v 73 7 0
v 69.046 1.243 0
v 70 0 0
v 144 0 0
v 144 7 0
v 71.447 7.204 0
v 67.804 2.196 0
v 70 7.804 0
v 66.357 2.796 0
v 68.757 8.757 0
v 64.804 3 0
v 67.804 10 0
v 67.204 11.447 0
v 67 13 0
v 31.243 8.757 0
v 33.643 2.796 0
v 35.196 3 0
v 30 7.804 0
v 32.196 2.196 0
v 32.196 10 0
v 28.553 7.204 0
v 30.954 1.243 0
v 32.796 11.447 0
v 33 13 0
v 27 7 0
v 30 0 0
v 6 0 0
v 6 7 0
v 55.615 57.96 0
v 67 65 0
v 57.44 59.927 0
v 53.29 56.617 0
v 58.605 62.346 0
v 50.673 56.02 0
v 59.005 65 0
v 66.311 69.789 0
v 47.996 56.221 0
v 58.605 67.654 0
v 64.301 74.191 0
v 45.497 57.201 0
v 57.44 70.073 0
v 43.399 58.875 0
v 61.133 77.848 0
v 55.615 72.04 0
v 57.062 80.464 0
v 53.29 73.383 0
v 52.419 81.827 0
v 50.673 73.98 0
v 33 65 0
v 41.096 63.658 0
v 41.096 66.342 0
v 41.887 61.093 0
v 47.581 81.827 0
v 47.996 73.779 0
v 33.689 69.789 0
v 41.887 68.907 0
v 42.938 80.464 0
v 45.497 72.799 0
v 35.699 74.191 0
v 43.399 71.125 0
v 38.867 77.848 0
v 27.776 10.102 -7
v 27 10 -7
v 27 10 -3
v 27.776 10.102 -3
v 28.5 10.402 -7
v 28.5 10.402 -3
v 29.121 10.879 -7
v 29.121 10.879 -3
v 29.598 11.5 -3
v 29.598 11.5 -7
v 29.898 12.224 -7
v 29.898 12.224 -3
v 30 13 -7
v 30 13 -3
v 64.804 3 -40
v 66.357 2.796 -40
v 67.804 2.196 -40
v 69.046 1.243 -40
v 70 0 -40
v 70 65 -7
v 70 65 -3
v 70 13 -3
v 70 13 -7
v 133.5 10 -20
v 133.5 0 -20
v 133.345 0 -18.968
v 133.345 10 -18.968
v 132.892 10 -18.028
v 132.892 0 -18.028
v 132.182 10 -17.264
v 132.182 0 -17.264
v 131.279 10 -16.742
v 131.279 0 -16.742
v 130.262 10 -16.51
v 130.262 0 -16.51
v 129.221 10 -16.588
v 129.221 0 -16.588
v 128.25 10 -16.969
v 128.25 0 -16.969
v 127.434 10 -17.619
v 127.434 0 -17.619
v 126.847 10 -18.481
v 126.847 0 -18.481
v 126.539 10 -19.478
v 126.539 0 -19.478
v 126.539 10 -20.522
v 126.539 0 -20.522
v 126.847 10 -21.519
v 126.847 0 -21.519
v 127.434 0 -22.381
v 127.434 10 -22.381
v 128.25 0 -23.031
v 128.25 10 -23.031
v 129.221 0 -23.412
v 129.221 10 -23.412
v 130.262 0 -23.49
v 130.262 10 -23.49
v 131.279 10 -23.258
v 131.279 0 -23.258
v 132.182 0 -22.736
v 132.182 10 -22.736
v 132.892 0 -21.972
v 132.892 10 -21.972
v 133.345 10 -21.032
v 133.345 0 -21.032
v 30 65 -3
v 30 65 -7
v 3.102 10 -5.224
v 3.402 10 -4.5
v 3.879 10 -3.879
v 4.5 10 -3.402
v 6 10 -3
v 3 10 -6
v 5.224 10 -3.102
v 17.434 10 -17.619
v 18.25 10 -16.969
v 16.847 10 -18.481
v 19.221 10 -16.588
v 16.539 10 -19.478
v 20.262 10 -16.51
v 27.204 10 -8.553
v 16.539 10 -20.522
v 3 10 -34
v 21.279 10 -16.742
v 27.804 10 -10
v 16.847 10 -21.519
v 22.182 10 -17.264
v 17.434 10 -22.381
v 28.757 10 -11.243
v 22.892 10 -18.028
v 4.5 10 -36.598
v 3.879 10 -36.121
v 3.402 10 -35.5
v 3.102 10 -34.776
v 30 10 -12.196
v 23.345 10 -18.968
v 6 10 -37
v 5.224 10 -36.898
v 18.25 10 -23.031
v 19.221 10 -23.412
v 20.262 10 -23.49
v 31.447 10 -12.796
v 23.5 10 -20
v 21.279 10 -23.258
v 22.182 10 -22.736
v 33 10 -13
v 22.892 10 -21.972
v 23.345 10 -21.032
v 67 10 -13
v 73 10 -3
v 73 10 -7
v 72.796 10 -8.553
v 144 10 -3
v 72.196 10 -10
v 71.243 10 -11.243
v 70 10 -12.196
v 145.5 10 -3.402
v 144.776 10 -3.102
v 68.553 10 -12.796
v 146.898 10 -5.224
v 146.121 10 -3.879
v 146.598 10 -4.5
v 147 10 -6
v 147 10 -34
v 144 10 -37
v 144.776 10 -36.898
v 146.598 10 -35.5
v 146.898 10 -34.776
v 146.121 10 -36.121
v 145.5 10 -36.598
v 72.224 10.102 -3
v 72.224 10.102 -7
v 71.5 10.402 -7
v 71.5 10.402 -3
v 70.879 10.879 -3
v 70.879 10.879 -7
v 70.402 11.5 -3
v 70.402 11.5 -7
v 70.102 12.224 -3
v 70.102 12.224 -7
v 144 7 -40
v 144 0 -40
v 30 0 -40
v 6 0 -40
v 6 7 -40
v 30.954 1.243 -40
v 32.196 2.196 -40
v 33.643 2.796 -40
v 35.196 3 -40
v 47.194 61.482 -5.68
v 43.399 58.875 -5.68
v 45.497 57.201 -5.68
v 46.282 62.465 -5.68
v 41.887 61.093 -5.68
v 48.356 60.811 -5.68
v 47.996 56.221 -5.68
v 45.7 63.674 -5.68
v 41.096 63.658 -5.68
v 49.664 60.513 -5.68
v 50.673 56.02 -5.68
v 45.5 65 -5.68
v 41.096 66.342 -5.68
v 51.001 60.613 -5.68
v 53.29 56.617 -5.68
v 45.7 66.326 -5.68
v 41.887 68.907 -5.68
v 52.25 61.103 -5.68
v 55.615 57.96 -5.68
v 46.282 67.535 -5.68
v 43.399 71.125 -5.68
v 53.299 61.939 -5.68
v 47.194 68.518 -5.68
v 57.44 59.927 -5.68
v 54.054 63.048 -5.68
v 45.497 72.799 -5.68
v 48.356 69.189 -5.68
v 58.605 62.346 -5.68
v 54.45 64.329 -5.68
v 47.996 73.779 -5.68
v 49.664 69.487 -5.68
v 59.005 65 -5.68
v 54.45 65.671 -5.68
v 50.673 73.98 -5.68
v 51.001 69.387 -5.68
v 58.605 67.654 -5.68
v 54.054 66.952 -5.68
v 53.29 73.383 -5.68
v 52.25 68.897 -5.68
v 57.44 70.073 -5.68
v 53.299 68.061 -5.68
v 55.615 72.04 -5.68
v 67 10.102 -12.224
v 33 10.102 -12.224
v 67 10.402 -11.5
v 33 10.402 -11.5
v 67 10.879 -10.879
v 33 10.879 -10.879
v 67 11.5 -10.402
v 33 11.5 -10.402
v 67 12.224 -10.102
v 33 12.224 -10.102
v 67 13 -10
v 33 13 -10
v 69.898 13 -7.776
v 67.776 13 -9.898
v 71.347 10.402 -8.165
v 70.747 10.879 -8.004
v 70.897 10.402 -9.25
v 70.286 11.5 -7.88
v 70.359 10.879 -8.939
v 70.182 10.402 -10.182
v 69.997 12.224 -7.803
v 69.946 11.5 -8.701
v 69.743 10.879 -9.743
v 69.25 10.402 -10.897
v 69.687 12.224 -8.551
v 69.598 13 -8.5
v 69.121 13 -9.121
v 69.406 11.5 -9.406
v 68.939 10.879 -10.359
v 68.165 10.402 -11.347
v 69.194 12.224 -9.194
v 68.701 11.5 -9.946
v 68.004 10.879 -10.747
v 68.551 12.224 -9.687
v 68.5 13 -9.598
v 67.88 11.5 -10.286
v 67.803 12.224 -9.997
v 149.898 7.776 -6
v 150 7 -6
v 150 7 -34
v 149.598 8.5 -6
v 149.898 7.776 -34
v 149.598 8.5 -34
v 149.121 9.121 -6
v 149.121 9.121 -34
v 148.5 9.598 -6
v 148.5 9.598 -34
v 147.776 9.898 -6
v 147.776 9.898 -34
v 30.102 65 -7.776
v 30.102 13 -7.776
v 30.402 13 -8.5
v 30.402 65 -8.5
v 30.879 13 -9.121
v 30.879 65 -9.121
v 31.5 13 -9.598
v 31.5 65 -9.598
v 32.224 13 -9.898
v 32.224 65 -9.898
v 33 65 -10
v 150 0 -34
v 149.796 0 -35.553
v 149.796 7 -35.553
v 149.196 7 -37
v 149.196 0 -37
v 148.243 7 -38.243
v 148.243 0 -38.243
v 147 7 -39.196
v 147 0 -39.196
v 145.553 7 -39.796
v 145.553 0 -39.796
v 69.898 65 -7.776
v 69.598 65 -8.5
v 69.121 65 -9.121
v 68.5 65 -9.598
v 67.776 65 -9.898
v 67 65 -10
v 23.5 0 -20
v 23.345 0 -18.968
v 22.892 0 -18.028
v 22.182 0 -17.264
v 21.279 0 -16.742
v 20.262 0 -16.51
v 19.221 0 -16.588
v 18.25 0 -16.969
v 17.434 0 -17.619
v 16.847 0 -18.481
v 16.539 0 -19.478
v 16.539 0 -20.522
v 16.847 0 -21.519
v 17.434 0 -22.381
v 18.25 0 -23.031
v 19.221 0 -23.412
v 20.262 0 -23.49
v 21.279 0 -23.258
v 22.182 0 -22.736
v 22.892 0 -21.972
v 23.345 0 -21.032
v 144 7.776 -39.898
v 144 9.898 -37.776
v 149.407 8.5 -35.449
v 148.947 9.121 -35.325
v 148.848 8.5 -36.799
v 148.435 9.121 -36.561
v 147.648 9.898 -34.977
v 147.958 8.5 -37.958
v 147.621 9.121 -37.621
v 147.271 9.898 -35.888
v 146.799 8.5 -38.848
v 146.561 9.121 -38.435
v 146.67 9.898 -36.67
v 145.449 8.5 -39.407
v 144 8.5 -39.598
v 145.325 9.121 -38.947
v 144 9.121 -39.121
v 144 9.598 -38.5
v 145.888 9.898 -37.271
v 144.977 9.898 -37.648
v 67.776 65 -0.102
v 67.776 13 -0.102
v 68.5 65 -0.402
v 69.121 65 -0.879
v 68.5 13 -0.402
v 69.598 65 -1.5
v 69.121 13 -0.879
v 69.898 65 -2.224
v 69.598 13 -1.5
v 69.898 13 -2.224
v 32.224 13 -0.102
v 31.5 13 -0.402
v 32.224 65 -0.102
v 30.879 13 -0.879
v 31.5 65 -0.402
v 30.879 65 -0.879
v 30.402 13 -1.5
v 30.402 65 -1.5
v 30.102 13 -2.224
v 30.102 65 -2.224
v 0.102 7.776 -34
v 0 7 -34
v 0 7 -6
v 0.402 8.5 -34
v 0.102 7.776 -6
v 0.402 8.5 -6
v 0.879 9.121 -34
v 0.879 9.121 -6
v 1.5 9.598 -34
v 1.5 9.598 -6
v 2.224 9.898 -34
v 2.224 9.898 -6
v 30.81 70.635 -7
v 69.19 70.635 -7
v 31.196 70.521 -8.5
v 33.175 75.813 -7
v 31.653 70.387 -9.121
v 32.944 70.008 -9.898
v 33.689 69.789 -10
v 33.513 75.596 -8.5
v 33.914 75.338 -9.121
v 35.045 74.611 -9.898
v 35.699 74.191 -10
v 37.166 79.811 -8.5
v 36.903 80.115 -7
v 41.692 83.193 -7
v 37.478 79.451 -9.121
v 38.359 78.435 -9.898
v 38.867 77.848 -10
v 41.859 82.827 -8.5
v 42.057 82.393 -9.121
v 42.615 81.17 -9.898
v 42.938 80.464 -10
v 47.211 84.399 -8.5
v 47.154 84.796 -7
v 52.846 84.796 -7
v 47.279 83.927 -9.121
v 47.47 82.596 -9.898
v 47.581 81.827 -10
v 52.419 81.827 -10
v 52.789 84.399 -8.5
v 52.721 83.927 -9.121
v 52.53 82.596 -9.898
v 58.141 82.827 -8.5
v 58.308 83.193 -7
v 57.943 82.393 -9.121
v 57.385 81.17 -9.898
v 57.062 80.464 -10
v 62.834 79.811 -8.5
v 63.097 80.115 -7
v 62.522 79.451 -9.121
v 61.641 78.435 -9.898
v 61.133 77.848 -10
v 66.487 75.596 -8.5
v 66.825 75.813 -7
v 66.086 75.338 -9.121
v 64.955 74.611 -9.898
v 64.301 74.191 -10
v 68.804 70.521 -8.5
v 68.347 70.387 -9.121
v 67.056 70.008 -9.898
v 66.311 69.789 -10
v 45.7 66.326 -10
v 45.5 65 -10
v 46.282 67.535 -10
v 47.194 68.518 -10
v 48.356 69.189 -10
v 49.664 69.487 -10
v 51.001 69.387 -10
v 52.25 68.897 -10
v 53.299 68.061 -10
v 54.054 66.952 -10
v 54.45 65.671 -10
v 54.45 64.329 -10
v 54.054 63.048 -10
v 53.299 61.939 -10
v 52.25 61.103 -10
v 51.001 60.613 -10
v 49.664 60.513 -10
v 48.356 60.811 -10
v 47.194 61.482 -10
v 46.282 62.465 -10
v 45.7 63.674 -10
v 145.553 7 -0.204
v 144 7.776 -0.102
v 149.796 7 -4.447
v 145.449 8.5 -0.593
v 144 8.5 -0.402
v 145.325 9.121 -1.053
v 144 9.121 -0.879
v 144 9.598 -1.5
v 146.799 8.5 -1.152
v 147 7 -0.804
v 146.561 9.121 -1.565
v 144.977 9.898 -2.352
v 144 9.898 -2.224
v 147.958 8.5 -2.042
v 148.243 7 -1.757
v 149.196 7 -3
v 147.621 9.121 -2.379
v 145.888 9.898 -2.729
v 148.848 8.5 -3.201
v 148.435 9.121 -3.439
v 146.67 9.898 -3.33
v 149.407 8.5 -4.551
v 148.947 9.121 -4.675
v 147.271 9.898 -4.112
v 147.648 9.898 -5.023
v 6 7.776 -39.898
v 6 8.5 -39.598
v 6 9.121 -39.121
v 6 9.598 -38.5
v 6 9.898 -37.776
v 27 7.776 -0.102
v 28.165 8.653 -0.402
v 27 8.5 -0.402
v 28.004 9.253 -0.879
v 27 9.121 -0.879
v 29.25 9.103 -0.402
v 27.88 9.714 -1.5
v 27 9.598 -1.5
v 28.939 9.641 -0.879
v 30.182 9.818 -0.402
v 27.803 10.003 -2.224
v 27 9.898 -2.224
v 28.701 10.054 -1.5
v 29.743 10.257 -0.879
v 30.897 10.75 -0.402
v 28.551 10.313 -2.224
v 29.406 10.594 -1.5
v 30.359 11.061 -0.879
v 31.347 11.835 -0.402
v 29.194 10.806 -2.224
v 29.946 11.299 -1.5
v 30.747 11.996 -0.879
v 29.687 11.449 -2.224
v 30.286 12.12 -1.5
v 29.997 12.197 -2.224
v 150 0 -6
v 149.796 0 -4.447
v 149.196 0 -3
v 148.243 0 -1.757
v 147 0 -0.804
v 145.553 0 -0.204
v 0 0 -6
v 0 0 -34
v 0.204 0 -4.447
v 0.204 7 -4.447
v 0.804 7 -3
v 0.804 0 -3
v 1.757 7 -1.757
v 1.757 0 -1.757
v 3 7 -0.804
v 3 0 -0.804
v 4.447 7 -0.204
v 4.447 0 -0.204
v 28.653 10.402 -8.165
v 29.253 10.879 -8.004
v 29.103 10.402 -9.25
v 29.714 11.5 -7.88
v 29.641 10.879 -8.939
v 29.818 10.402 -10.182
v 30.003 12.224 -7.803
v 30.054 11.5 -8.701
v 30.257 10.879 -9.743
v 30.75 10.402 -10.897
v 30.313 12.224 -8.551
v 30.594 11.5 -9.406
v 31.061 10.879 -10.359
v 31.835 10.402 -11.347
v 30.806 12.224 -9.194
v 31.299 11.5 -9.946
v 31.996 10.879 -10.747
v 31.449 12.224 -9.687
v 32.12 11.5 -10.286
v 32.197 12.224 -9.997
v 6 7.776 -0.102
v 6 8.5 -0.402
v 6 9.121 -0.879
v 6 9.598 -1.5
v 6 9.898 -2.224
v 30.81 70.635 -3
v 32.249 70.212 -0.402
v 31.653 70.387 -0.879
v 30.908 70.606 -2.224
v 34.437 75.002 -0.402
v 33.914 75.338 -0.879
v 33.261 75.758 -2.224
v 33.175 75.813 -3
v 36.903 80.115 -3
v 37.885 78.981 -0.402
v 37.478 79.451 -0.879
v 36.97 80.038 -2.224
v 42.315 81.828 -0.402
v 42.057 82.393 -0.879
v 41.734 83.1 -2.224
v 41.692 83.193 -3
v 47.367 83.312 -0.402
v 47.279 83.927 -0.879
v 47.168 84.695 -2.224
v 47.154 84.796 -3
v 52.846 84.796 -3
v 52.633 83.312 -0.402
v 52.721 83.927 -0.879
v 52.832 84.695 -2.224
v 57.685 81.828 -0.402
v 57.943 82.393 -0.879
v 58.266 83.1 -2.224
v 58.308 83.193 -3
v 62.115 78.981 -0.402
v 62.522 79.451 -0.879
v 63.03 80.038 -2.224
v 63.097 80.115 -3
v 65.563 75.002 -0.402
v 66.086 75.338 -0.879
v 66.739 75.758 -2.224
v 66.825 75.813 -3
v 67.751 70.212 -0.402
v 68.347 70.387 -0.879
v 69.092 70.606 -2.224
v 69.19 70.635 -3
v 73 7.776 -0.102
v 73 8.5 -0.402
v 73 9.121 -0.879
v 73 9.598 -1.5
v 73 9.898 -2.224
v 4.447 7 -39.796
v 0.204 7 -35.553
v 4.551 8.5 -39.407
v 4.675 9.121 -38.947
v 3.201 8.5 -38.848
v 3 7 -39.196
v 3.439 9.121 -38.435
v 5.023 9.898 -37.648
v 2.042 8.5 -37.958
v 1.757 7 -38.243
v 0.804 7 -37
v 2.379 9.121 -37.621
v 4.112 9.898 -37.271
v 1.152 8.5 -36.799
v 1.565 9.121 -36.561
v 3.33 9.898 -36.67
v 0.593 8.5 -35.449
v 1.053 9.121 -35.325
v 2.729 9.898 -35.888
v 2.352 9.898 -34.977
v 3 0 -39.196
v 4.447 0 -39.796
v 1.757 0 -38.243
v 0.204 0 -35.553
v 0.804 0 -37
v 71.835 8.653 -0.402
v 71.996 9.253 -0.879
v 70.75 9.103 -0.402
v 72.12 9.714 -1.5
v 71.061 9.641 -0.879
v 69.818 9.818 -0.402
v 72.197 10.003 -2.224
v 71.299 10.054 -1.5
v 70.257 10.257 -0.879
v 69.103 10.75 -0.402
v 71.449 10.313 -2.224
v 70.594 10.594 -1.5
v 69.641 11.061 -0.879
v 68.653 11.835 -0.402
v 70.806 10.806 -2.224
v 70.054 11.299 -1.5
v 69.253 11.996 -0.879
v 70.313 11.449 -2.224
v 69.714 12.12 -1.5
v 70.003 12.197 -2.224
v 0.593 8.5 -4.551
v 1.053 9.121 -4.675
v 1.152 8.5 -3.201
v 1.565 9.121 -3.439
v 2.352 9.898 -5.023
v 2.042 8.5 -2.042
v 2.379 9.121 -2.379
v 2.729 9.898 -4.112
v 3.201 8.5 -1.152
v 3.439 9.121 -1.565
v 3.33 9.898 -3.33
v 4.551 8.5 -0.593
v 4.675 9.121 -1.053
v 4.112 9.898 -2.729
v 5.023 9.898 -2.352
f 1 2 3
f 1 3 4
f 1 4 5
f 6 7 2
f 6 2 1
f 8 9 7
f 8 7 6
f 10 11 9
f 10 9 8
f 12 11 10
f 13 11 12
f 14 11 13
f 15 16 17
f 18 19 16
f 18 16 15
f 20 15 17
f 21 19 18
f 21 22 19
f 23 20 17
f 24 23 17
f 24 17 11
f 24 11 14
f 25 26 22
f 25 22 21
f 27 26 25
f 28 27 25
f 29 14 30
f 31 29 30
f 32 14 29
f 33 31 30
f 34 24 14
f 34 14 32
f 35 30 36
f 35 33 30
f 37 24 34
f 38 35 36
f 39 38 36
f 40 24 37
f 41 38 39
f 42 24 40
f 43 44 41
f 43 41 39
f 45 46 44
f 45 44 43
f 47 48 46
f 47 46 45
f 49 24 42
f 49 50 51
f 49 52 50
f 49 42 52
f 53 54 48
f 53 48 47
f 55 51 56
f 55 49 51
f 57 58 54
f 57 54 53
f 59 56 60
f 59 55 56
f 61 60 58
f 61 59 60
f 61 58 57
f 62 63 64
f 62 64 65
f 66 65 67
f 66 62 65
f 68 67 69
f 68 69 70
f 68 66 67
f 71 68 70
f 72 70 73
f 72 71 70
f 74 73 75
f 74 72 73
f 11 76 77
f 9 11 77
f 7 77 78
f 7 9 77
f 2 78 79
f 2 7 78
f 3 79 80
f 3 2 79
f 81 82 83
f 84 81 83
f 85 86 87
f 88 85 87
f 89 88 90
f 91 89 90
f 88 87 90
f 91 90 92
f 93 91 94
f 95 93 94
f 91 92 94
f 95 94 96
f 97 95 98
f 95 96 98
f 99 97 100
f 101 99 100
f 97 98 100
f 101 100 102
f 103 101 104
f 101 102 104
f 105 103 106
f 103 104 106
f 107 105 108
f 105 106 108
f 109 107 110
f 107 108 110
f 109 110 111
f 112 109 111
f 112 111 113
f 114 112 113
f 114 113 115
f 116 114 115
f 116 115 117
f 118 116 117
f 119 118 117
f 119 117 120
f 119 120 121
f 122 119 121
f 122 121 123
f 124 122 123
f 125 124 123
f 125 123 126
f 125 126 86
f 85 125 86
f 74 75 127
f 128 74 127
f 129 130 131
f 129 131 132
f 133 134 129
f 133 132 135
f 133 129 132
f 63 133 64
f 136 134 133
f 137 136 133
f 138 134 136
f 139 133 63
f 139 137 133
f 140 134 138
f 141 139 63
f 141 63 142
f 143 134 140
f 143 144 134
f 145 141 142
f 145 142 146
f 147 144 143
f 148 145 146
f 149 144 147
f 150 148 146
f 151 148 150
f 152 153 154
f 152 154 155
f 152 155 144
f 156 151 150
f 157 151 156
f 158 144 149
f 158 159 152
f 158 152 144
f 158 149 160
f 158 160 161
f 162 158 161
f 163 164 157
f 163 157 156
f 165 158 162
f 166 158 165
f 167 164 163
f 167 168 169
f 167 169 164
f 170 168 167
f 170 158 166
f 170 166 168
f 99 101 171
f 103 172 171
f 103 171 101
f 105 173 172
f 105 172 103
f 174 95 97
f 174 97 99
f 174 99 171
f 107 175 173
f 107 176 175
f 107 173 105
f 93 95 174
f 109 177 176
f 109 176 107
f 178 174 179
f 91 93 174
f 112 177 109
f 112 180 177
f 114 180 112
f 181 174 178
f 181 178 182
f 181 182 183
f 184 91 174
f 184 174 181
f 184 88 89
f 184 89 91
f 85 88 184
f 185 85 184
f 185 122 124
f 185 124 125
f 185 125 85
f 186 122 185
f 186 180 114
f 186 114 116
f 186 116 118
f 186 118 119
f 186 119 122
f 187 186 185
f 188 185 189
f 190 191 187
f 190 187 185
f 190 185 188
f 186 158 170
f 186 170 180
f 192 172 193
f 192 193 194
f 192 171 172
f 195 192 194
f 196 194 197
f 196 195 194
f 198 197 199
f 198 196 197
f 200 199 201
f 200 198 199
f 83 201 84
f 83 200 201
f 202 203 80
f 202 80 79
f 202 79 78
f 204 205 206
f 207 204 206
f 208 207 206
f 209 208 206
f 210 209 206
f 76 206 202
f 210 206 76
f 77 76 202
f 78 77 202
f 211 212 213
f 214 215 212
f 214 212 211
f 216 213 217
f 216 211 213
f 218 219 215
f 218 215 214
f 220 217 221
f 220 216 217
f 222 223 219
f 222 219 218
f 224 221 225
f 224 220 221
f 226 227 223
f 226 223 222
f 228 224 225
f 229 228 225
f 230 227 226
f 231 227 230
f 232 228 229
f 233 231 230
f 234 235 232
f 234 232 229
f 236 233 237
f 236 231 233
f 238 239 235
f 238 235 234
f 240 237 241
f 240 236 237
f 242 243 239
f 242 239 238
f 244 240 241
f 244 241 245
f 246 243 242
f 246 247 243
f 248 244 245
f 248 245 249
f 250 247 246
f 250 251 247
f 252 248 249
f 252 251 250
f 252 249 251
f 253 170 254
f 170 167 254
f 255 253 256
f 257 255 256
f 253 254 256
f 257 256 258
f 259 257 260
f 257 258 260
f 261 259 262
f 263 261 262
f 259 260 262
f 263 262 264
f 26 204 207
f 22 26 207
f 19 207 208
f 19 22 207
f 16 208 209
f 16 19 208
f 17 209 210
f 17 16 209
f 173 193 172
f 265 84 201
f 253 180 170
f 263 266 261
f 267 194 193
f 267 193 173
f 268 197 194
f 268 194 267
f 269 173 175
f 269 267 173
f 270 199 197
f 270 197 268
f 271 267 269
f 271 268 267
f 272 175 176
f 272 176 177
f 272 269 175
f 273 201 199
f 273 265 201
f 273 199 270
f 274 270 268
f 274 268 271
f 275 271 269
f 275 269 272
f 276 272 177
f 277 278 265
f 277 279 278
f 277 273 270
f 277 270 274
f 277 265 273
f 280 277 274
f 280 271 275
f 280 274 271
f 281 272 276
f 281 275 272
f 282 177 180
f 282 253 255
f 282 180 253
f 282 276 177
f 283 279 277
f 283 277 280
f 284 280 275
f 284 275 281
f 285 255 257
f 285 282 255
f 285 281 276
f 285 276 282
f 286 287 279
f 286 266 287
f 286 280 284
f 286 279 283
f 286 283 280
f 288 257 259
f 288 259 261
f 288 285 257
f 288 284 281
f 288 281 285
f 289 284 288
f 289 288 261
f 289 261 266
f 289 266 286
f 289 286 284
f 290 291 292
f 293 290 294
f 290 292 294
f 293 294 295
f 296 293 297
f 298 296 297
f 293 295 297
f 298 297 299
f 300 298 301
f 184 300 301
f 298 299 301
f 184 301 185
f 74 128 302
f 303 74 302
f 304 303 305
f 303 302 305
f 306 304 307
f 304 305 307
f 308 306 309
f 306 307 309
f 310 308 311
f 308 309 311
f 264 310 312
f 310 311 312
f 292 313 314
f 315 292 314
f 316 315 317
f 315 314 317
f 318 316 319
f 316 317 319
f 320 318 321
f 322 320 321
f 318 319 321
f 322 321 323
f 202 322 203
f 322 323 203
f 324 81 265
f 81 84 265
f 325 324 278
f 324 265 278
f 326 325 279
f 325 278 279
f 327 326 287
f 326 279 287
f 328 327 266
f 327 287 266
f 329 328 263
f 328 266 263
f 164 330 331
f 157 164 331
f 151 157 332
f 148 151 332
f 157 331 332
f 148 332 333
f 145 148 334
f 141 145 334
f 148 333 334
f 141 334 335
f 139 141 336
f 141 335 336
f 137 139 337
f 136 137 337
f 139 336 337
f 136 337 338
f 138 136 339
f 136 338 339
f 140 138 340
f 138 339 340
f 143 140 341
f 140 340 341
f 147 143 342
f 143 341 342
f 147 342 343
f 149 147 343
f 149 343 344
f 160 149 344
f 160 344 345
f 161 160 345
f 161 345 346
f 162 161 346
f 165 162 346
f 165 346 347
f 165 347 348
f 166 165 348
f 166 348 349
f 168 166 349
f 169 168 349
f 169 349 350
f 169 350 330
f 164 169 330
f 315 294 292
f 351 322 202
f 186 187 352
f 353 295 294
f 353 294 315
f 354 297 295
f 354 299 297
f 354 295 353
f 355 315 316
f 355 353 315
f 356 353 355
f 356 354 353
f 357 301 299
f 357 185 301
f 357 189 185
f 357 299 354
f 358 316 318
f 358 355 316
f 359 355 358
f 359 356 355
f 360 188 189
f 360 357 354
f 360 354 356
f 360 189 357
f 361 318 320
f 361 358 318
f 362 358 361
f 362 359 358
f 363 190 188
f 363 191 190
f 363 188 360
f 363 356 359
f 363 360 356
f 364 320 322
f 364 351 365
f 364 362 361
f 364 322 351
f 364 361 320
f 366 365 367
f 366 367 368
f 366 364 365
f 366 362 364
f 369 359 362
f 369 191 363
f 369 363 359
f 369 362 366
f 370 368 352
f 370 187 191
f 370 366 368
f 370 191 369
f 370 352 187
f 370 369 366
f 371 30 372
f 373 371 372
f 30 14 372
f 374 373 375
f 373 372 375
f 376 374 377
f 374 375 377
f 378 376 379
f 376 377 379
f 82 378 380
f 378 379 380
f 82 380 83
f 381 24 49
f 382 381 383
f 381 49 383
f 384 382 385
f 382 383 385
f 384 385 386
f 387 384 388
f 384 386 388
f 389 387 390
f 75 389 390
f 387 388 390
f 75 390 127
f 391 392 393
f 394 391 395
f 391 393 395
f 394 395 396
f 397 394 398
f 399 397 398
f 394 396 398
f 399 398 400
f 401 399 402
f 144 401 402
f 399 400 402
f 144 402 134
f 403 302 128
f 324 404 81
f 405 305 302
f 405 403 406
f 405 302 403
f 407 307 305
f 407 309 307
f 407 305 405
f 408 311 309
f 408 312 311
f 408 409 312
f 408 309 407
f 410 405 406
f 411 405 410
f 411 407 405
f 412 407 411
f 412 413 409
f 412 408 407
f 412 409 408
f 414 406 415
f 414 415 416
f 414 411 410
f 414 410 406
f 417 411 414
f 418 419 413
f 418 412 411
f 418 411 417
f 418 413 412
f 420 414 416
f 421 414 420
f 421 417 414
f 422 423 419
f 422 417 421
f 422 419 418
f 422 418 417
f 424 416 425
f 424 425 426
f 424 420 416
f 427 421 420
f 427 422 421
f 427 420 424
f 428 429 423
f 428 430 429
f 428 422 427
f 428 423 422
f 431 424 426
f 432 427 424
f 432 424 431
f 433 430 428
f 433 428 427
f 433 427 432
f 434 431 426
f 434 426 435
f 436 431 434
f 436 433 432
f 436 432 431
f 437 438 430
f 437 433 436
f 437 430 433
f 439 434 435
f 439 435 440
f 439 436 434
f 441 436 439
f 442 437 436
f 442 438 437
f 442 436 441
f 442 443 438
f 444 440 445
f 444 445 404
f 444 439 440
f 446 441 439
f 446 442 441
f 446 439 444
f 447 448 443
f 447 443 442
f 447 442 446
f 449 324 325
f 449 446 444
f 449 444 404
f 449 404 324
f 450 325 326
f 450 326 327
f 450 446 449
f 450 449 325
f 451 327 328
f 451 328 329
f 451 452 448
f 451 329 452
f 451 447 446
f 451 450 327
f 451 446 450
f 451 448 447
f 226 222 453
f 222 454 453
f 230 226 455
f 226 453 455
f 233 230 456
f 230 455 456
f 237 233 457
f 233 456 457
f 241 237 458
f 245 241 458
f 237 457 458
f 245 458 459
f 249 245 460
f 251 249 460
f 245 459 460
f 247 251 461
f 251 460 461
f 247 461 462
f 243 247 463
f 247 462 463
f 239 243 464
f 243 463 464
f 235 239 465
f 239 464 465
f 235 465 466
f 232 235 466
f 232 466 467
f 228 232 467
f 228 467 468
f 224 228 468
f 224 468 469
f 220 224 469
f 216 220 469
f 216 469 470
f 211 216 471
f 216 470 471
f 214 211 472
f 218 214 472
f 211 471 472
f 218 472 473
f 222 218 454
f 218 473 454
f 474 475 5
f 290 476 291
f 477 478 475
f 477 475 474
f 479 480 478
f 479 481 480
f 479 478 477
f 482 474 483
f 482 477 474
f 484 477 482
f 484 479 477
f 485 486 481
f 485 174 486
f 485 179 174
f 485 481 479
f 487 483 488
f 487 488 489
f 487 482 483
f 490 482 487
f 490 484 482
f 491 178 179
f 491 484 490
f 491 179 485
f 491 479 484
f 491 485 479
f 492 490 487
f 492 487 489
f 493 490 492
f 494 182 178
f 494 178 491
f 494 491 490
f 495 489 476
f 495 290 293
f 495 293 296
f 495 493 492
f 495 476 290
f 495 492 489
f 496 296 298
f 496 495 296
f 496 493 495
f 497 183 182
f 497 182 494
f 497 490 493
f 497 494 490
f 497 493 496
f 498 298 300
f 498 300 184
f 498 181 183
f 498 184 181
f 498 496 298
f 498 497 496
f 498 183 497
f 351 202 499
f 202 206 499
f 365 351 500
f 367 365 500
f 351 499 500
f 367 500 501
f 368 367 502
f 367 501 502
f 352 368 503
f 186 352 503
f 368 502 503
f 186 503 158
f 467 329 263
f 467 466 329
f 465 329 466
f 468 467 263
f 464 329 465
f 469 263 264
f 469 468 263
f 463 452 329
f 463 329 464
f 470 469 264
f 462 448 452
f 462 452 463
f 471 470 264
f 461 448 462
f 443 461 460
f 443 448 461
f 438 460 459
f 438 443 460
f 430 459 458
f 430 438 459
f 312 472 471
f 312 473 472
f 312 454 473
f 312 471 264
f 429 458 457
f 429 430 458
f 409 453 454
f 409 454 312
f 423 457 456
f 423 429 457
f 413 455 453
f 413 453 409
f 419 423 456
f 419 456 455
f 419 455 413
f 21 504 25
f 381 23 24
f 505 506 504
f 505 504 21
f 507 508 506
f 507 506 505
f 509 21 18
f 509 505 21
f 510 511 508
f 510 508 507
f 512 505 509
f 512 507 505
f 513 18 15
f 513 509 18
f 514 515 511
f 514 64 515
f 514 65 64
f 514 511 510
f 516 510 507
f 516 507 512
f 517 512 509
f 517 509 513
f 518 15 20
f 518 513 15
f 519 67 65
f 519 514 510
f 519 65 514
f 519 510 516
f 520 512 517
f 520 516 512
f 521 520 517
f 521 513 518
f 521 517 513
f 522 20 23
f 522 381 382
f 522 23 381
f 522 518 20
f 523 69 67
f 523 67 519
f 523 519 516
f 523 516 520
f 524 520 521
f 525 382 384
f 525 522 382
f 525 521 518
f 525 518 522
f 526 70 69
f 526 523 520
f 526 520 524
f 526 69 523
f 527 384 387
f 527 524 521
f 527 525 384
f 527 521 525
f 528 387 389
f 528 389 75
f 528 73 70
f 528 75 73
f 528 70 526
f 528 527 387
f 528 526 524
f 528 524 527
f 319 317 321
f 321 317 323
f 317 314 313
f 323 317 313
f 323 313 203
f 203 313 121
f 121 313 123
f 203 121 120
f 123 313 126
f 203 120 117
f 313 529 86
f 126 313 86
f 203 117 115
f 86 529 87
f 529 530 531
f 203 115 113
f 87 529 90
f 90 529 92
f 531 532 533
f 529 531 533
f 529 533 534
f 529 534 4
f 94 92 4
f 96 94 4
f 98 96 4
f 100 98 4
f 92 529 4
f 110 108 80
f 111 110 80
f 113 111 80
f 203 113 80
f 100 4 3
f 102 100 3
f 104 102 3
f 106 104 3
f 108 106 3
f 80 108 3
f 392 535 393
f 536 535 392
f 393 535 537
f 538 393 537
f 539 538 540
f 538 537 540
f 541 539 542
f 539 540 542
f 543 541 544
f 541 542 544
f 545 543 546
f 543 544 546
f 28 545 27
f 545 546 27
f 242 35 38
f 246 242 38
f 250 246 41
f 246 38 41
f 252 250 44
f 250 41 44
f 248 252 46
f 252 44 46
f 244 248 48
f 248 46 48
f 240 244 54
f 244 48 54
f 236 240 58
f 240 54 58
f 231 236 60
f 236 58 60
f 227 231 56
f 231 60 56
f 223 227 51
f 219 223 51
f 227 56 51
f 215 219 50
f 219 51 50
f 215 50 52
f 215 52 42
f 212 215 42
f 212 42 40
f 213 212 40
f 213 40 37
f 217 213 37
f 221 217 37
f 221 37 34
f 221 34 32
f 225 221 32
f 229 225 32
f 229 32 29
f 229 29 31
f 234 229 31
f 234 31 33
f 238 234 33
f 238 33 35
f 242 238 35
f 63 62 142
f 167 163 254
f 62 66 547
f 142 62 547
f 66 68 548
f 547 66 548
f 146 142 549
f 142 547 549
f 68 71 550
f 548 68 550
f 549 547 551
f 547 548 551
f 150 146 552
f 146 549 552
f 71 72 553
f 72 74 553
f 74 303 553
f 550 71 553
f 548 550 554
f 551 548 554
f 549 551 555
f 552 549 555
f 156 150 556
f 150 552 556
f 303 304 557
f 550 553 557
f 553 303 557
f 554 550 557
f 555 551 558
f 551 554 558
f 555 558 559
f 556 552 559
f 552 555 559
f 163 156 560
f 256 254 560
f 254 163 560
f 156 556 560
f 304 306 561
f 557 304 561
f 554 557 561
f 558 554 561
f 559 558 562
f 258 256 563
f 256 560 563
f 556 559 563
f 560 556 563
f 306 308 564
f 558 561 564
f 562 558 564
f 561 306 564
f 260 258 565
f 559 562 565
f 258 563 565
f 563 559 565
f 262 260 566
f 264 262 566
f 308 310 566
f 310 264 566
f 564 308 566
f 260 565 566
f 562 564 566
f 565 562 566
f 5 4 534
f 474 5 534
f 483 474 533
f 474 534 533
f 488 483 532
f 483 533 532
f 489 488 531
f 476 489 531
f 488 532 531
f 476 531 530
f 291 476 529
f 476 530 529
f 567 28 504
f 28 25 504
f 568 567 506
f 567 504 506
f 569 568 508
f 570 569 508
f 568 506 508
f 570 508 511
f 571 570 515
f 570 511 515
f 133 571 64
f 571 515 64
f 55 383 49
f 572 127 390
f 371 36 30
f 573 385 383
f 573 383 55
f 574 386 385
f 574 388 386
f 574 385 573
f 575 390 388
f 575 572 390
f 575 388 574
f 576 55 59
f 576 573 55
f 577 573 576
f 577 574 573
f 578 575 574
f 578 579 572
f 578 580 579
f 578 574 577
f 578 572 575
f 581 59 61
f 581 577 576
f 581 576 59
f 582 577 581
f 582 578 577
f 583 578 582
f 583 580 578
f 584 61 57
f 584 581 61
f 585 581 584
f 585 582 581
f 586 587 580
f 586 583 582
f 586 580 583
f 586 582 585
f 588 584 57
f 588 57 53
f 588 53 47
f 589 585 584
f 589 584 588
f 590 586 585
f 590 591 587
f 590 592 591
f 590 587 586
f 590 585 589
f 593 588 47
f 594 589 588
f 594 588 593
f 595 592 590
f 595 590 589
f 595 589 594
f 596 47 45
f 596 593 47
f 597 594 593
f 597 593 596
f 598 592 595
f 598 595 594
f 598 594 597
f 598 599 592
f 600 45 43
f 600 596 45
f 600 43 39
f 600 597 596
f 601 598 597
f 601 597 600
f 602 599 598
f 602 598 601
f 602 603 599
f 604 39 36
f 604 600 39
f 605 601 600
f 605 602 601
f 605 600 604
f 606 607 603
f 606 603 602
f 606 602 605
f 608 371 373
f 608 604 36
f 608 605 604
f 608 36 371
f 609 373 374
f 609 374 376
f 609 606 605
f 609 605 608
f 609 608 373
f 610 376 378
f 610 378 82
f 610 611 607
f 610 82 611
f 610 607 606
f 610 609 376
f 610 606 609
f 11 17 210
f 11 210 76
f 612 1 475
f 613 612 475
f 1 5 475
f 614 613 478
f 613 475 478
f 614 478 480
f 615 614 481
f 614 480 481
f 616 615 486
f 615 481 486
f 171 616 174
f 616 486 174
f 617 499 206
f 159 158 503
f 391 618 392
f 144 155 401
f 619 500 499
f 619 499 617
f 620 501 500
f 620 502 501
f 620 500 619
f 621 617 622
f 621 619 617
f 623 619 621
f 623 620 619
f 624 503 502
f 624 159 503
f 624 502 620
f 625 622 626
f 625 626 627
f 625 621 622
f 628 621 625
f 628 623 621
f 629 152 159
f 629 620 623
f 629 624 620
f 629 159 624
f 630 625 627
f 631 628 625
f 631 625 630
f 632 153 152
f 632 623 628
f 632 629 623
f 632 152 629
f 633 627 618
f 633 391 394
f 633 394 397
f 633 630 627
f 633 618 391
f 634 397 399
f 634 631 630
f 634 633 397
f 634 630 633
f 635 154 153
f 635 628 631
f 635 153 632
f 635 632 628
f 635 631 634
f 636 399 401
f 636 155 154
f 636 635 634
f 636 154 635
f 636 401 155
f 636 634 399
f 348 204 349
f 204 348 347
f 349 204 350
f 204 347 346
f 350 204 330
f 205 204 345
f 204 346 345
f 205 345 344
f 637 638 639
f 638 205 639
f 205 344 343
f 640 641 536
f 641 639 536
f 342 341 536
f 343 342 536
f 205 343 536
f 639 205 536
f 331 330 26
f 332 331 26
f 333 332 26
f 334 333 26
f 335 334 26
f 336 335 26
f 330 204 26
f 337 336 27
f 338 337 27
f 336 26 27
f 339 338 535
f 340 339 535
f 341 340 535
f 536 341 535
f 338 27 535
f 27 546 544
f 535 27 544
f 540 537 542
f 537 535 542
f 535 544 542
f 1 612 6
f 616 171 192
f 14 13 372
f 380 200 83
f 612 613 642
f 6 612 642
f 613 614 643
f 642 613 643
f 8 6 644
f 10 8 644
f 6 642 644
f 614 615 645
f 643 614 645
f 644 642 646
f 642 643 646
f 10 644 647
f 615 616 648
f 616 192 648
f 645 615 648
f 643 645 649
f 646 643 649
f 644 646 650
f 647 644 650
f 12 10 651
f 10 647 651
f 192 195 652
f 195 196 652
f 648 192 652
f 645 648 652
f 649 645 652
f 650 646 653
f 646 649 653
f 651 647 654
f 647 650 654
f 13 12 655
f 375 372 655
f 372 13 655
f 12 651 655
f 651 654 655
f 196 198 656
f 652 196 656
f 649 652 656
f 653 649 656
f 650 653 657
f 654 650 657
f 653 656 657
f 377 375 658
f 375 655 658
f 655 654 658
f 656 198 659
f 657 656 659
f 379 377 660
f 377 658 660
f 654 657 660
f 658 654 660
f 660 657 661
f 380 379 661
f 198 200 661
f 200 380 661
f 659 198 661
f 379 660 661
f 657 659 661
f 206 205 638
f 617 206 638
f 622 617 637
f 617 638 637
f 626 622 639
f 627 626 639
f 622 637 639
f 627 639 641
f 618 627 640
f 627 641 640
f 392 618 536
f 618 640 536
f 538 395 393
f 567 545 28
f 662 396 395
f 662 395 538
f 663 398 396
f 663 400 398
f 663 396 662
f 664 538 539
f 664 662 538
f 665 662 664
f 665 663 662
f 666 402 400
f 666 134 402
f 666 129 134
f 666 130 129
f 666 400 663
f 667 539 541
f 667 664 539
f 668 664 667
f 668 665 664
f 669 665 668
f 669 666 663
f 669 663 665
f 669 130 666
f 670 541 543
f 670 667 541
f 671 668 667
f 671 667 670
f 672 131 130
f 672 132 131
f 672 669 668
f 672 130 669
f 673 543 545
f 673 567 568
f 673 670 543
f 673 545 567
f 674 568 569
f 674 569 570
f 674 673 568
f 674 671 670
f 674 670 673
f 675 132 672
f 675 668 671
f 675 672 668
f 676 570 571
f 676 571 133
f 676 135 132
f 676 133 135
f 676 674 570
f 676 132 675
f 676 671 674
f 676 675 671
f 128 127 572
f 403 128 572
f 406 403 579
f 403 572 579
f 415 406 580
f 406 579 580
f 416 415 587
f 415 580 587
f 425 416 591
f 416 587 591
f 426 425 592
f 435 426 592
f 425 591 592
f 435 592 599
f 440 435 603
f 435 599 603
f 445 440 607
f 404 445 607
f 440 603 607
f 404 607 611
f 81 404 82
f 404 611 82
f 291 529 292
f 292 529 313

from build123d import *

# Parameters (mm, degrees)
SKETCH1_W                               = 150
SKETCH1_H                               = 40
BASE_PLATE_DEPTH                        = 10
VERT_BOSS_DEPTH                         = 10
SKETCH5_W                               = 40
SKETCH5_H                               = 3
SLOT_DEPTH                              = 177.988700204
F_7_0_7_DIAMETER_HOLE1_D                = 7
CBORE_FOR_M8_HEX_HEAD_BOLT1_D           = 9
CBORE_FOR_M8_HEX_HEAD_BOLT1_CBORE_D     = 18.01
CBORE_FOR_M8_HEX_HEAD_BOLT1_CBORE_DEPTH = 5.68
FILLET1_R                               = 6
FILLET2_R                               = 3


with BuildPart() as part:
    # Sketch1 → Base Plate (new body)
    with BuildSketch(Plane(origin=(0, 0, 0), x_dir=(1, 0, 0), z_dir=(0, 1, 0))):
        with Locations((75, 20)):
            Rectangle(SKETCH1_W, SKETCH1_H)
    extrude(amount=BASE_PLATE_DEPTH)

    # Sketch2 → Vert Boss (add)
    with BuildSketch(Plane.XY):
        with BuildLine():
            Line((30, 0), (30, 65))
            ThreePointArc((30, 65), (50, 85), (70, 65))
            Line((70, 65), (70, 0))
            Line((70, 0), (30, 0))
        make_face()
    extrude(amount=-VERT_BOSS_DEPTH)

    # Sketch5 → Slot (cut, through all)
    with BuildSketch(Plane.XY):
        with Locations((50, 1.5)):
            Rectangle(SKETCH5_W, SKETCH5_H)
    extrude(amount=-SLOT_DEPTH, mode=Mode.SUBTRACT)

    # Ø7.0 (7) Diameter Hole1 (through all)
    with Locations(Plane(origin=(0, 10, 0), x_dir=(-1, 0, 0), z_dir=(0, 1, 0))):
        with Locations((-130, -20), (-20, -20)):
            Hole(F_7_0_7_DIAMETER_HOLE1_D / 2)

    # CBORE for M8 Hex Head Bolt1 (through all)
    with Locations(Plane.XY):
        with Locations((50, 65)):
            CounterBoreHole(CBORE_FOR_M8_HEX_HEAD_BOLT1_D / 2, CBORE_FOR_M8_HEX_HEAD_BOLT1_CBORE_D / 2, CBORE_FOR_M8_HEX_HEAD_BOLT1_CBORE_DEPTH)

    # Fillet1
    # the kernel refuses this fillet: 6 mm, written as the material it adds along each edge
    with BuildSketch(Plane(origin=(70, 3, 0), x_dir=(-1, 0, 0), z_dir=(0, 0, -1))) as fillet1_piece_1:
        with BuildLine():
            CenterArc((5.196152423, -6), FILLET1_R, 90, 60)
            Line((0, -3), (0, 0))
            Line((0, 0), (5.196152423, 0))
        make_face()
    extrude(amount=40)
    with BuildSketch(Plane(origin=(30, 3, 0), x_dir=(0, -1, 0), z_dir=(0, 0, -1))) as fillet1_piece_2:
        with BuildLine():
            CenterArc((6, -5.196152423), FILLET1_R, 120, 60)
            Line((0, -5.196152423), (0, 0))
            Line((0, 0), (3, 0))
        make_face()
    extrude(amount=40)
    # the kernel refuses this fillet: 6 mm, written as the material it takes off along each edge
    with BuildSketch(Plane(origin=(0, -15, 0), x_dir=(1, 0, 0), z_dir=(0, 1, 0)), Plane(origin=(0, -15, -40), x_dir=(0, 0, 1), z_dir=(0, 1, 0))) as fillet1_2_piece_1:
        with BuildLine():
            CenterArc((FILLET1_R, FILLET1_R), FILLET1_R, 180, 90)
            Line((0, FILLET1_R), (0, 0))
            Line((0, 0), (FILLET1_R, 0))
        make_face()
    extrude(amount=40, mode=Mode.SUBTRACT)
    with BuildSketch(Plane(origin=(150, -15, -40), x_dir=(0, 0, 1), z_dir=(0, 1, 0)), Plane(origin=(150, -15, 0), x_dir=(-1, 0, 0), z_dir=(0, 1, 0))) as fillet1_2_piece_2:
        with BuildLine():
            CenterArc((FILLET1_R, -FILLET1_R), FILLET1_R, 90, 90)
            Line((0, -FILLET1_R), (0, 0))
            Line((0, 0), (FILLET1_R, 0))
        make_face()
    extrude(amount=40, mode=Mode.SUBTRACT)

    # Fillet2
    fillet2_edges = [part.edges().sort_by_distance(p)[0] for p in [
        (107, 10, 0),
        (30, 37.5, -10),
        (70, 37.5, -10),
        (30, 37.5, 0),
        (70, 37.5, 0),
        (50, 85, 0),
        (30, 10, -5),
        (50, 85, -10),
        (70, 10, -5),
        (50, 10, -10),
        (18, 10, 0),
        (0, 10, -20),
        (150, 10, -20),
        (75, 10, -40),
        (148.242640687, 10, -1.757359313),
        (148.242640687, 10, -38.242640687),
        (1.757359313, 10, -38.242640687),
        (1.757359313, 10, -1.757359313),
    ]]
    fillet(fillet2_edges, radius=FILLET2_R)


solid = part.part
